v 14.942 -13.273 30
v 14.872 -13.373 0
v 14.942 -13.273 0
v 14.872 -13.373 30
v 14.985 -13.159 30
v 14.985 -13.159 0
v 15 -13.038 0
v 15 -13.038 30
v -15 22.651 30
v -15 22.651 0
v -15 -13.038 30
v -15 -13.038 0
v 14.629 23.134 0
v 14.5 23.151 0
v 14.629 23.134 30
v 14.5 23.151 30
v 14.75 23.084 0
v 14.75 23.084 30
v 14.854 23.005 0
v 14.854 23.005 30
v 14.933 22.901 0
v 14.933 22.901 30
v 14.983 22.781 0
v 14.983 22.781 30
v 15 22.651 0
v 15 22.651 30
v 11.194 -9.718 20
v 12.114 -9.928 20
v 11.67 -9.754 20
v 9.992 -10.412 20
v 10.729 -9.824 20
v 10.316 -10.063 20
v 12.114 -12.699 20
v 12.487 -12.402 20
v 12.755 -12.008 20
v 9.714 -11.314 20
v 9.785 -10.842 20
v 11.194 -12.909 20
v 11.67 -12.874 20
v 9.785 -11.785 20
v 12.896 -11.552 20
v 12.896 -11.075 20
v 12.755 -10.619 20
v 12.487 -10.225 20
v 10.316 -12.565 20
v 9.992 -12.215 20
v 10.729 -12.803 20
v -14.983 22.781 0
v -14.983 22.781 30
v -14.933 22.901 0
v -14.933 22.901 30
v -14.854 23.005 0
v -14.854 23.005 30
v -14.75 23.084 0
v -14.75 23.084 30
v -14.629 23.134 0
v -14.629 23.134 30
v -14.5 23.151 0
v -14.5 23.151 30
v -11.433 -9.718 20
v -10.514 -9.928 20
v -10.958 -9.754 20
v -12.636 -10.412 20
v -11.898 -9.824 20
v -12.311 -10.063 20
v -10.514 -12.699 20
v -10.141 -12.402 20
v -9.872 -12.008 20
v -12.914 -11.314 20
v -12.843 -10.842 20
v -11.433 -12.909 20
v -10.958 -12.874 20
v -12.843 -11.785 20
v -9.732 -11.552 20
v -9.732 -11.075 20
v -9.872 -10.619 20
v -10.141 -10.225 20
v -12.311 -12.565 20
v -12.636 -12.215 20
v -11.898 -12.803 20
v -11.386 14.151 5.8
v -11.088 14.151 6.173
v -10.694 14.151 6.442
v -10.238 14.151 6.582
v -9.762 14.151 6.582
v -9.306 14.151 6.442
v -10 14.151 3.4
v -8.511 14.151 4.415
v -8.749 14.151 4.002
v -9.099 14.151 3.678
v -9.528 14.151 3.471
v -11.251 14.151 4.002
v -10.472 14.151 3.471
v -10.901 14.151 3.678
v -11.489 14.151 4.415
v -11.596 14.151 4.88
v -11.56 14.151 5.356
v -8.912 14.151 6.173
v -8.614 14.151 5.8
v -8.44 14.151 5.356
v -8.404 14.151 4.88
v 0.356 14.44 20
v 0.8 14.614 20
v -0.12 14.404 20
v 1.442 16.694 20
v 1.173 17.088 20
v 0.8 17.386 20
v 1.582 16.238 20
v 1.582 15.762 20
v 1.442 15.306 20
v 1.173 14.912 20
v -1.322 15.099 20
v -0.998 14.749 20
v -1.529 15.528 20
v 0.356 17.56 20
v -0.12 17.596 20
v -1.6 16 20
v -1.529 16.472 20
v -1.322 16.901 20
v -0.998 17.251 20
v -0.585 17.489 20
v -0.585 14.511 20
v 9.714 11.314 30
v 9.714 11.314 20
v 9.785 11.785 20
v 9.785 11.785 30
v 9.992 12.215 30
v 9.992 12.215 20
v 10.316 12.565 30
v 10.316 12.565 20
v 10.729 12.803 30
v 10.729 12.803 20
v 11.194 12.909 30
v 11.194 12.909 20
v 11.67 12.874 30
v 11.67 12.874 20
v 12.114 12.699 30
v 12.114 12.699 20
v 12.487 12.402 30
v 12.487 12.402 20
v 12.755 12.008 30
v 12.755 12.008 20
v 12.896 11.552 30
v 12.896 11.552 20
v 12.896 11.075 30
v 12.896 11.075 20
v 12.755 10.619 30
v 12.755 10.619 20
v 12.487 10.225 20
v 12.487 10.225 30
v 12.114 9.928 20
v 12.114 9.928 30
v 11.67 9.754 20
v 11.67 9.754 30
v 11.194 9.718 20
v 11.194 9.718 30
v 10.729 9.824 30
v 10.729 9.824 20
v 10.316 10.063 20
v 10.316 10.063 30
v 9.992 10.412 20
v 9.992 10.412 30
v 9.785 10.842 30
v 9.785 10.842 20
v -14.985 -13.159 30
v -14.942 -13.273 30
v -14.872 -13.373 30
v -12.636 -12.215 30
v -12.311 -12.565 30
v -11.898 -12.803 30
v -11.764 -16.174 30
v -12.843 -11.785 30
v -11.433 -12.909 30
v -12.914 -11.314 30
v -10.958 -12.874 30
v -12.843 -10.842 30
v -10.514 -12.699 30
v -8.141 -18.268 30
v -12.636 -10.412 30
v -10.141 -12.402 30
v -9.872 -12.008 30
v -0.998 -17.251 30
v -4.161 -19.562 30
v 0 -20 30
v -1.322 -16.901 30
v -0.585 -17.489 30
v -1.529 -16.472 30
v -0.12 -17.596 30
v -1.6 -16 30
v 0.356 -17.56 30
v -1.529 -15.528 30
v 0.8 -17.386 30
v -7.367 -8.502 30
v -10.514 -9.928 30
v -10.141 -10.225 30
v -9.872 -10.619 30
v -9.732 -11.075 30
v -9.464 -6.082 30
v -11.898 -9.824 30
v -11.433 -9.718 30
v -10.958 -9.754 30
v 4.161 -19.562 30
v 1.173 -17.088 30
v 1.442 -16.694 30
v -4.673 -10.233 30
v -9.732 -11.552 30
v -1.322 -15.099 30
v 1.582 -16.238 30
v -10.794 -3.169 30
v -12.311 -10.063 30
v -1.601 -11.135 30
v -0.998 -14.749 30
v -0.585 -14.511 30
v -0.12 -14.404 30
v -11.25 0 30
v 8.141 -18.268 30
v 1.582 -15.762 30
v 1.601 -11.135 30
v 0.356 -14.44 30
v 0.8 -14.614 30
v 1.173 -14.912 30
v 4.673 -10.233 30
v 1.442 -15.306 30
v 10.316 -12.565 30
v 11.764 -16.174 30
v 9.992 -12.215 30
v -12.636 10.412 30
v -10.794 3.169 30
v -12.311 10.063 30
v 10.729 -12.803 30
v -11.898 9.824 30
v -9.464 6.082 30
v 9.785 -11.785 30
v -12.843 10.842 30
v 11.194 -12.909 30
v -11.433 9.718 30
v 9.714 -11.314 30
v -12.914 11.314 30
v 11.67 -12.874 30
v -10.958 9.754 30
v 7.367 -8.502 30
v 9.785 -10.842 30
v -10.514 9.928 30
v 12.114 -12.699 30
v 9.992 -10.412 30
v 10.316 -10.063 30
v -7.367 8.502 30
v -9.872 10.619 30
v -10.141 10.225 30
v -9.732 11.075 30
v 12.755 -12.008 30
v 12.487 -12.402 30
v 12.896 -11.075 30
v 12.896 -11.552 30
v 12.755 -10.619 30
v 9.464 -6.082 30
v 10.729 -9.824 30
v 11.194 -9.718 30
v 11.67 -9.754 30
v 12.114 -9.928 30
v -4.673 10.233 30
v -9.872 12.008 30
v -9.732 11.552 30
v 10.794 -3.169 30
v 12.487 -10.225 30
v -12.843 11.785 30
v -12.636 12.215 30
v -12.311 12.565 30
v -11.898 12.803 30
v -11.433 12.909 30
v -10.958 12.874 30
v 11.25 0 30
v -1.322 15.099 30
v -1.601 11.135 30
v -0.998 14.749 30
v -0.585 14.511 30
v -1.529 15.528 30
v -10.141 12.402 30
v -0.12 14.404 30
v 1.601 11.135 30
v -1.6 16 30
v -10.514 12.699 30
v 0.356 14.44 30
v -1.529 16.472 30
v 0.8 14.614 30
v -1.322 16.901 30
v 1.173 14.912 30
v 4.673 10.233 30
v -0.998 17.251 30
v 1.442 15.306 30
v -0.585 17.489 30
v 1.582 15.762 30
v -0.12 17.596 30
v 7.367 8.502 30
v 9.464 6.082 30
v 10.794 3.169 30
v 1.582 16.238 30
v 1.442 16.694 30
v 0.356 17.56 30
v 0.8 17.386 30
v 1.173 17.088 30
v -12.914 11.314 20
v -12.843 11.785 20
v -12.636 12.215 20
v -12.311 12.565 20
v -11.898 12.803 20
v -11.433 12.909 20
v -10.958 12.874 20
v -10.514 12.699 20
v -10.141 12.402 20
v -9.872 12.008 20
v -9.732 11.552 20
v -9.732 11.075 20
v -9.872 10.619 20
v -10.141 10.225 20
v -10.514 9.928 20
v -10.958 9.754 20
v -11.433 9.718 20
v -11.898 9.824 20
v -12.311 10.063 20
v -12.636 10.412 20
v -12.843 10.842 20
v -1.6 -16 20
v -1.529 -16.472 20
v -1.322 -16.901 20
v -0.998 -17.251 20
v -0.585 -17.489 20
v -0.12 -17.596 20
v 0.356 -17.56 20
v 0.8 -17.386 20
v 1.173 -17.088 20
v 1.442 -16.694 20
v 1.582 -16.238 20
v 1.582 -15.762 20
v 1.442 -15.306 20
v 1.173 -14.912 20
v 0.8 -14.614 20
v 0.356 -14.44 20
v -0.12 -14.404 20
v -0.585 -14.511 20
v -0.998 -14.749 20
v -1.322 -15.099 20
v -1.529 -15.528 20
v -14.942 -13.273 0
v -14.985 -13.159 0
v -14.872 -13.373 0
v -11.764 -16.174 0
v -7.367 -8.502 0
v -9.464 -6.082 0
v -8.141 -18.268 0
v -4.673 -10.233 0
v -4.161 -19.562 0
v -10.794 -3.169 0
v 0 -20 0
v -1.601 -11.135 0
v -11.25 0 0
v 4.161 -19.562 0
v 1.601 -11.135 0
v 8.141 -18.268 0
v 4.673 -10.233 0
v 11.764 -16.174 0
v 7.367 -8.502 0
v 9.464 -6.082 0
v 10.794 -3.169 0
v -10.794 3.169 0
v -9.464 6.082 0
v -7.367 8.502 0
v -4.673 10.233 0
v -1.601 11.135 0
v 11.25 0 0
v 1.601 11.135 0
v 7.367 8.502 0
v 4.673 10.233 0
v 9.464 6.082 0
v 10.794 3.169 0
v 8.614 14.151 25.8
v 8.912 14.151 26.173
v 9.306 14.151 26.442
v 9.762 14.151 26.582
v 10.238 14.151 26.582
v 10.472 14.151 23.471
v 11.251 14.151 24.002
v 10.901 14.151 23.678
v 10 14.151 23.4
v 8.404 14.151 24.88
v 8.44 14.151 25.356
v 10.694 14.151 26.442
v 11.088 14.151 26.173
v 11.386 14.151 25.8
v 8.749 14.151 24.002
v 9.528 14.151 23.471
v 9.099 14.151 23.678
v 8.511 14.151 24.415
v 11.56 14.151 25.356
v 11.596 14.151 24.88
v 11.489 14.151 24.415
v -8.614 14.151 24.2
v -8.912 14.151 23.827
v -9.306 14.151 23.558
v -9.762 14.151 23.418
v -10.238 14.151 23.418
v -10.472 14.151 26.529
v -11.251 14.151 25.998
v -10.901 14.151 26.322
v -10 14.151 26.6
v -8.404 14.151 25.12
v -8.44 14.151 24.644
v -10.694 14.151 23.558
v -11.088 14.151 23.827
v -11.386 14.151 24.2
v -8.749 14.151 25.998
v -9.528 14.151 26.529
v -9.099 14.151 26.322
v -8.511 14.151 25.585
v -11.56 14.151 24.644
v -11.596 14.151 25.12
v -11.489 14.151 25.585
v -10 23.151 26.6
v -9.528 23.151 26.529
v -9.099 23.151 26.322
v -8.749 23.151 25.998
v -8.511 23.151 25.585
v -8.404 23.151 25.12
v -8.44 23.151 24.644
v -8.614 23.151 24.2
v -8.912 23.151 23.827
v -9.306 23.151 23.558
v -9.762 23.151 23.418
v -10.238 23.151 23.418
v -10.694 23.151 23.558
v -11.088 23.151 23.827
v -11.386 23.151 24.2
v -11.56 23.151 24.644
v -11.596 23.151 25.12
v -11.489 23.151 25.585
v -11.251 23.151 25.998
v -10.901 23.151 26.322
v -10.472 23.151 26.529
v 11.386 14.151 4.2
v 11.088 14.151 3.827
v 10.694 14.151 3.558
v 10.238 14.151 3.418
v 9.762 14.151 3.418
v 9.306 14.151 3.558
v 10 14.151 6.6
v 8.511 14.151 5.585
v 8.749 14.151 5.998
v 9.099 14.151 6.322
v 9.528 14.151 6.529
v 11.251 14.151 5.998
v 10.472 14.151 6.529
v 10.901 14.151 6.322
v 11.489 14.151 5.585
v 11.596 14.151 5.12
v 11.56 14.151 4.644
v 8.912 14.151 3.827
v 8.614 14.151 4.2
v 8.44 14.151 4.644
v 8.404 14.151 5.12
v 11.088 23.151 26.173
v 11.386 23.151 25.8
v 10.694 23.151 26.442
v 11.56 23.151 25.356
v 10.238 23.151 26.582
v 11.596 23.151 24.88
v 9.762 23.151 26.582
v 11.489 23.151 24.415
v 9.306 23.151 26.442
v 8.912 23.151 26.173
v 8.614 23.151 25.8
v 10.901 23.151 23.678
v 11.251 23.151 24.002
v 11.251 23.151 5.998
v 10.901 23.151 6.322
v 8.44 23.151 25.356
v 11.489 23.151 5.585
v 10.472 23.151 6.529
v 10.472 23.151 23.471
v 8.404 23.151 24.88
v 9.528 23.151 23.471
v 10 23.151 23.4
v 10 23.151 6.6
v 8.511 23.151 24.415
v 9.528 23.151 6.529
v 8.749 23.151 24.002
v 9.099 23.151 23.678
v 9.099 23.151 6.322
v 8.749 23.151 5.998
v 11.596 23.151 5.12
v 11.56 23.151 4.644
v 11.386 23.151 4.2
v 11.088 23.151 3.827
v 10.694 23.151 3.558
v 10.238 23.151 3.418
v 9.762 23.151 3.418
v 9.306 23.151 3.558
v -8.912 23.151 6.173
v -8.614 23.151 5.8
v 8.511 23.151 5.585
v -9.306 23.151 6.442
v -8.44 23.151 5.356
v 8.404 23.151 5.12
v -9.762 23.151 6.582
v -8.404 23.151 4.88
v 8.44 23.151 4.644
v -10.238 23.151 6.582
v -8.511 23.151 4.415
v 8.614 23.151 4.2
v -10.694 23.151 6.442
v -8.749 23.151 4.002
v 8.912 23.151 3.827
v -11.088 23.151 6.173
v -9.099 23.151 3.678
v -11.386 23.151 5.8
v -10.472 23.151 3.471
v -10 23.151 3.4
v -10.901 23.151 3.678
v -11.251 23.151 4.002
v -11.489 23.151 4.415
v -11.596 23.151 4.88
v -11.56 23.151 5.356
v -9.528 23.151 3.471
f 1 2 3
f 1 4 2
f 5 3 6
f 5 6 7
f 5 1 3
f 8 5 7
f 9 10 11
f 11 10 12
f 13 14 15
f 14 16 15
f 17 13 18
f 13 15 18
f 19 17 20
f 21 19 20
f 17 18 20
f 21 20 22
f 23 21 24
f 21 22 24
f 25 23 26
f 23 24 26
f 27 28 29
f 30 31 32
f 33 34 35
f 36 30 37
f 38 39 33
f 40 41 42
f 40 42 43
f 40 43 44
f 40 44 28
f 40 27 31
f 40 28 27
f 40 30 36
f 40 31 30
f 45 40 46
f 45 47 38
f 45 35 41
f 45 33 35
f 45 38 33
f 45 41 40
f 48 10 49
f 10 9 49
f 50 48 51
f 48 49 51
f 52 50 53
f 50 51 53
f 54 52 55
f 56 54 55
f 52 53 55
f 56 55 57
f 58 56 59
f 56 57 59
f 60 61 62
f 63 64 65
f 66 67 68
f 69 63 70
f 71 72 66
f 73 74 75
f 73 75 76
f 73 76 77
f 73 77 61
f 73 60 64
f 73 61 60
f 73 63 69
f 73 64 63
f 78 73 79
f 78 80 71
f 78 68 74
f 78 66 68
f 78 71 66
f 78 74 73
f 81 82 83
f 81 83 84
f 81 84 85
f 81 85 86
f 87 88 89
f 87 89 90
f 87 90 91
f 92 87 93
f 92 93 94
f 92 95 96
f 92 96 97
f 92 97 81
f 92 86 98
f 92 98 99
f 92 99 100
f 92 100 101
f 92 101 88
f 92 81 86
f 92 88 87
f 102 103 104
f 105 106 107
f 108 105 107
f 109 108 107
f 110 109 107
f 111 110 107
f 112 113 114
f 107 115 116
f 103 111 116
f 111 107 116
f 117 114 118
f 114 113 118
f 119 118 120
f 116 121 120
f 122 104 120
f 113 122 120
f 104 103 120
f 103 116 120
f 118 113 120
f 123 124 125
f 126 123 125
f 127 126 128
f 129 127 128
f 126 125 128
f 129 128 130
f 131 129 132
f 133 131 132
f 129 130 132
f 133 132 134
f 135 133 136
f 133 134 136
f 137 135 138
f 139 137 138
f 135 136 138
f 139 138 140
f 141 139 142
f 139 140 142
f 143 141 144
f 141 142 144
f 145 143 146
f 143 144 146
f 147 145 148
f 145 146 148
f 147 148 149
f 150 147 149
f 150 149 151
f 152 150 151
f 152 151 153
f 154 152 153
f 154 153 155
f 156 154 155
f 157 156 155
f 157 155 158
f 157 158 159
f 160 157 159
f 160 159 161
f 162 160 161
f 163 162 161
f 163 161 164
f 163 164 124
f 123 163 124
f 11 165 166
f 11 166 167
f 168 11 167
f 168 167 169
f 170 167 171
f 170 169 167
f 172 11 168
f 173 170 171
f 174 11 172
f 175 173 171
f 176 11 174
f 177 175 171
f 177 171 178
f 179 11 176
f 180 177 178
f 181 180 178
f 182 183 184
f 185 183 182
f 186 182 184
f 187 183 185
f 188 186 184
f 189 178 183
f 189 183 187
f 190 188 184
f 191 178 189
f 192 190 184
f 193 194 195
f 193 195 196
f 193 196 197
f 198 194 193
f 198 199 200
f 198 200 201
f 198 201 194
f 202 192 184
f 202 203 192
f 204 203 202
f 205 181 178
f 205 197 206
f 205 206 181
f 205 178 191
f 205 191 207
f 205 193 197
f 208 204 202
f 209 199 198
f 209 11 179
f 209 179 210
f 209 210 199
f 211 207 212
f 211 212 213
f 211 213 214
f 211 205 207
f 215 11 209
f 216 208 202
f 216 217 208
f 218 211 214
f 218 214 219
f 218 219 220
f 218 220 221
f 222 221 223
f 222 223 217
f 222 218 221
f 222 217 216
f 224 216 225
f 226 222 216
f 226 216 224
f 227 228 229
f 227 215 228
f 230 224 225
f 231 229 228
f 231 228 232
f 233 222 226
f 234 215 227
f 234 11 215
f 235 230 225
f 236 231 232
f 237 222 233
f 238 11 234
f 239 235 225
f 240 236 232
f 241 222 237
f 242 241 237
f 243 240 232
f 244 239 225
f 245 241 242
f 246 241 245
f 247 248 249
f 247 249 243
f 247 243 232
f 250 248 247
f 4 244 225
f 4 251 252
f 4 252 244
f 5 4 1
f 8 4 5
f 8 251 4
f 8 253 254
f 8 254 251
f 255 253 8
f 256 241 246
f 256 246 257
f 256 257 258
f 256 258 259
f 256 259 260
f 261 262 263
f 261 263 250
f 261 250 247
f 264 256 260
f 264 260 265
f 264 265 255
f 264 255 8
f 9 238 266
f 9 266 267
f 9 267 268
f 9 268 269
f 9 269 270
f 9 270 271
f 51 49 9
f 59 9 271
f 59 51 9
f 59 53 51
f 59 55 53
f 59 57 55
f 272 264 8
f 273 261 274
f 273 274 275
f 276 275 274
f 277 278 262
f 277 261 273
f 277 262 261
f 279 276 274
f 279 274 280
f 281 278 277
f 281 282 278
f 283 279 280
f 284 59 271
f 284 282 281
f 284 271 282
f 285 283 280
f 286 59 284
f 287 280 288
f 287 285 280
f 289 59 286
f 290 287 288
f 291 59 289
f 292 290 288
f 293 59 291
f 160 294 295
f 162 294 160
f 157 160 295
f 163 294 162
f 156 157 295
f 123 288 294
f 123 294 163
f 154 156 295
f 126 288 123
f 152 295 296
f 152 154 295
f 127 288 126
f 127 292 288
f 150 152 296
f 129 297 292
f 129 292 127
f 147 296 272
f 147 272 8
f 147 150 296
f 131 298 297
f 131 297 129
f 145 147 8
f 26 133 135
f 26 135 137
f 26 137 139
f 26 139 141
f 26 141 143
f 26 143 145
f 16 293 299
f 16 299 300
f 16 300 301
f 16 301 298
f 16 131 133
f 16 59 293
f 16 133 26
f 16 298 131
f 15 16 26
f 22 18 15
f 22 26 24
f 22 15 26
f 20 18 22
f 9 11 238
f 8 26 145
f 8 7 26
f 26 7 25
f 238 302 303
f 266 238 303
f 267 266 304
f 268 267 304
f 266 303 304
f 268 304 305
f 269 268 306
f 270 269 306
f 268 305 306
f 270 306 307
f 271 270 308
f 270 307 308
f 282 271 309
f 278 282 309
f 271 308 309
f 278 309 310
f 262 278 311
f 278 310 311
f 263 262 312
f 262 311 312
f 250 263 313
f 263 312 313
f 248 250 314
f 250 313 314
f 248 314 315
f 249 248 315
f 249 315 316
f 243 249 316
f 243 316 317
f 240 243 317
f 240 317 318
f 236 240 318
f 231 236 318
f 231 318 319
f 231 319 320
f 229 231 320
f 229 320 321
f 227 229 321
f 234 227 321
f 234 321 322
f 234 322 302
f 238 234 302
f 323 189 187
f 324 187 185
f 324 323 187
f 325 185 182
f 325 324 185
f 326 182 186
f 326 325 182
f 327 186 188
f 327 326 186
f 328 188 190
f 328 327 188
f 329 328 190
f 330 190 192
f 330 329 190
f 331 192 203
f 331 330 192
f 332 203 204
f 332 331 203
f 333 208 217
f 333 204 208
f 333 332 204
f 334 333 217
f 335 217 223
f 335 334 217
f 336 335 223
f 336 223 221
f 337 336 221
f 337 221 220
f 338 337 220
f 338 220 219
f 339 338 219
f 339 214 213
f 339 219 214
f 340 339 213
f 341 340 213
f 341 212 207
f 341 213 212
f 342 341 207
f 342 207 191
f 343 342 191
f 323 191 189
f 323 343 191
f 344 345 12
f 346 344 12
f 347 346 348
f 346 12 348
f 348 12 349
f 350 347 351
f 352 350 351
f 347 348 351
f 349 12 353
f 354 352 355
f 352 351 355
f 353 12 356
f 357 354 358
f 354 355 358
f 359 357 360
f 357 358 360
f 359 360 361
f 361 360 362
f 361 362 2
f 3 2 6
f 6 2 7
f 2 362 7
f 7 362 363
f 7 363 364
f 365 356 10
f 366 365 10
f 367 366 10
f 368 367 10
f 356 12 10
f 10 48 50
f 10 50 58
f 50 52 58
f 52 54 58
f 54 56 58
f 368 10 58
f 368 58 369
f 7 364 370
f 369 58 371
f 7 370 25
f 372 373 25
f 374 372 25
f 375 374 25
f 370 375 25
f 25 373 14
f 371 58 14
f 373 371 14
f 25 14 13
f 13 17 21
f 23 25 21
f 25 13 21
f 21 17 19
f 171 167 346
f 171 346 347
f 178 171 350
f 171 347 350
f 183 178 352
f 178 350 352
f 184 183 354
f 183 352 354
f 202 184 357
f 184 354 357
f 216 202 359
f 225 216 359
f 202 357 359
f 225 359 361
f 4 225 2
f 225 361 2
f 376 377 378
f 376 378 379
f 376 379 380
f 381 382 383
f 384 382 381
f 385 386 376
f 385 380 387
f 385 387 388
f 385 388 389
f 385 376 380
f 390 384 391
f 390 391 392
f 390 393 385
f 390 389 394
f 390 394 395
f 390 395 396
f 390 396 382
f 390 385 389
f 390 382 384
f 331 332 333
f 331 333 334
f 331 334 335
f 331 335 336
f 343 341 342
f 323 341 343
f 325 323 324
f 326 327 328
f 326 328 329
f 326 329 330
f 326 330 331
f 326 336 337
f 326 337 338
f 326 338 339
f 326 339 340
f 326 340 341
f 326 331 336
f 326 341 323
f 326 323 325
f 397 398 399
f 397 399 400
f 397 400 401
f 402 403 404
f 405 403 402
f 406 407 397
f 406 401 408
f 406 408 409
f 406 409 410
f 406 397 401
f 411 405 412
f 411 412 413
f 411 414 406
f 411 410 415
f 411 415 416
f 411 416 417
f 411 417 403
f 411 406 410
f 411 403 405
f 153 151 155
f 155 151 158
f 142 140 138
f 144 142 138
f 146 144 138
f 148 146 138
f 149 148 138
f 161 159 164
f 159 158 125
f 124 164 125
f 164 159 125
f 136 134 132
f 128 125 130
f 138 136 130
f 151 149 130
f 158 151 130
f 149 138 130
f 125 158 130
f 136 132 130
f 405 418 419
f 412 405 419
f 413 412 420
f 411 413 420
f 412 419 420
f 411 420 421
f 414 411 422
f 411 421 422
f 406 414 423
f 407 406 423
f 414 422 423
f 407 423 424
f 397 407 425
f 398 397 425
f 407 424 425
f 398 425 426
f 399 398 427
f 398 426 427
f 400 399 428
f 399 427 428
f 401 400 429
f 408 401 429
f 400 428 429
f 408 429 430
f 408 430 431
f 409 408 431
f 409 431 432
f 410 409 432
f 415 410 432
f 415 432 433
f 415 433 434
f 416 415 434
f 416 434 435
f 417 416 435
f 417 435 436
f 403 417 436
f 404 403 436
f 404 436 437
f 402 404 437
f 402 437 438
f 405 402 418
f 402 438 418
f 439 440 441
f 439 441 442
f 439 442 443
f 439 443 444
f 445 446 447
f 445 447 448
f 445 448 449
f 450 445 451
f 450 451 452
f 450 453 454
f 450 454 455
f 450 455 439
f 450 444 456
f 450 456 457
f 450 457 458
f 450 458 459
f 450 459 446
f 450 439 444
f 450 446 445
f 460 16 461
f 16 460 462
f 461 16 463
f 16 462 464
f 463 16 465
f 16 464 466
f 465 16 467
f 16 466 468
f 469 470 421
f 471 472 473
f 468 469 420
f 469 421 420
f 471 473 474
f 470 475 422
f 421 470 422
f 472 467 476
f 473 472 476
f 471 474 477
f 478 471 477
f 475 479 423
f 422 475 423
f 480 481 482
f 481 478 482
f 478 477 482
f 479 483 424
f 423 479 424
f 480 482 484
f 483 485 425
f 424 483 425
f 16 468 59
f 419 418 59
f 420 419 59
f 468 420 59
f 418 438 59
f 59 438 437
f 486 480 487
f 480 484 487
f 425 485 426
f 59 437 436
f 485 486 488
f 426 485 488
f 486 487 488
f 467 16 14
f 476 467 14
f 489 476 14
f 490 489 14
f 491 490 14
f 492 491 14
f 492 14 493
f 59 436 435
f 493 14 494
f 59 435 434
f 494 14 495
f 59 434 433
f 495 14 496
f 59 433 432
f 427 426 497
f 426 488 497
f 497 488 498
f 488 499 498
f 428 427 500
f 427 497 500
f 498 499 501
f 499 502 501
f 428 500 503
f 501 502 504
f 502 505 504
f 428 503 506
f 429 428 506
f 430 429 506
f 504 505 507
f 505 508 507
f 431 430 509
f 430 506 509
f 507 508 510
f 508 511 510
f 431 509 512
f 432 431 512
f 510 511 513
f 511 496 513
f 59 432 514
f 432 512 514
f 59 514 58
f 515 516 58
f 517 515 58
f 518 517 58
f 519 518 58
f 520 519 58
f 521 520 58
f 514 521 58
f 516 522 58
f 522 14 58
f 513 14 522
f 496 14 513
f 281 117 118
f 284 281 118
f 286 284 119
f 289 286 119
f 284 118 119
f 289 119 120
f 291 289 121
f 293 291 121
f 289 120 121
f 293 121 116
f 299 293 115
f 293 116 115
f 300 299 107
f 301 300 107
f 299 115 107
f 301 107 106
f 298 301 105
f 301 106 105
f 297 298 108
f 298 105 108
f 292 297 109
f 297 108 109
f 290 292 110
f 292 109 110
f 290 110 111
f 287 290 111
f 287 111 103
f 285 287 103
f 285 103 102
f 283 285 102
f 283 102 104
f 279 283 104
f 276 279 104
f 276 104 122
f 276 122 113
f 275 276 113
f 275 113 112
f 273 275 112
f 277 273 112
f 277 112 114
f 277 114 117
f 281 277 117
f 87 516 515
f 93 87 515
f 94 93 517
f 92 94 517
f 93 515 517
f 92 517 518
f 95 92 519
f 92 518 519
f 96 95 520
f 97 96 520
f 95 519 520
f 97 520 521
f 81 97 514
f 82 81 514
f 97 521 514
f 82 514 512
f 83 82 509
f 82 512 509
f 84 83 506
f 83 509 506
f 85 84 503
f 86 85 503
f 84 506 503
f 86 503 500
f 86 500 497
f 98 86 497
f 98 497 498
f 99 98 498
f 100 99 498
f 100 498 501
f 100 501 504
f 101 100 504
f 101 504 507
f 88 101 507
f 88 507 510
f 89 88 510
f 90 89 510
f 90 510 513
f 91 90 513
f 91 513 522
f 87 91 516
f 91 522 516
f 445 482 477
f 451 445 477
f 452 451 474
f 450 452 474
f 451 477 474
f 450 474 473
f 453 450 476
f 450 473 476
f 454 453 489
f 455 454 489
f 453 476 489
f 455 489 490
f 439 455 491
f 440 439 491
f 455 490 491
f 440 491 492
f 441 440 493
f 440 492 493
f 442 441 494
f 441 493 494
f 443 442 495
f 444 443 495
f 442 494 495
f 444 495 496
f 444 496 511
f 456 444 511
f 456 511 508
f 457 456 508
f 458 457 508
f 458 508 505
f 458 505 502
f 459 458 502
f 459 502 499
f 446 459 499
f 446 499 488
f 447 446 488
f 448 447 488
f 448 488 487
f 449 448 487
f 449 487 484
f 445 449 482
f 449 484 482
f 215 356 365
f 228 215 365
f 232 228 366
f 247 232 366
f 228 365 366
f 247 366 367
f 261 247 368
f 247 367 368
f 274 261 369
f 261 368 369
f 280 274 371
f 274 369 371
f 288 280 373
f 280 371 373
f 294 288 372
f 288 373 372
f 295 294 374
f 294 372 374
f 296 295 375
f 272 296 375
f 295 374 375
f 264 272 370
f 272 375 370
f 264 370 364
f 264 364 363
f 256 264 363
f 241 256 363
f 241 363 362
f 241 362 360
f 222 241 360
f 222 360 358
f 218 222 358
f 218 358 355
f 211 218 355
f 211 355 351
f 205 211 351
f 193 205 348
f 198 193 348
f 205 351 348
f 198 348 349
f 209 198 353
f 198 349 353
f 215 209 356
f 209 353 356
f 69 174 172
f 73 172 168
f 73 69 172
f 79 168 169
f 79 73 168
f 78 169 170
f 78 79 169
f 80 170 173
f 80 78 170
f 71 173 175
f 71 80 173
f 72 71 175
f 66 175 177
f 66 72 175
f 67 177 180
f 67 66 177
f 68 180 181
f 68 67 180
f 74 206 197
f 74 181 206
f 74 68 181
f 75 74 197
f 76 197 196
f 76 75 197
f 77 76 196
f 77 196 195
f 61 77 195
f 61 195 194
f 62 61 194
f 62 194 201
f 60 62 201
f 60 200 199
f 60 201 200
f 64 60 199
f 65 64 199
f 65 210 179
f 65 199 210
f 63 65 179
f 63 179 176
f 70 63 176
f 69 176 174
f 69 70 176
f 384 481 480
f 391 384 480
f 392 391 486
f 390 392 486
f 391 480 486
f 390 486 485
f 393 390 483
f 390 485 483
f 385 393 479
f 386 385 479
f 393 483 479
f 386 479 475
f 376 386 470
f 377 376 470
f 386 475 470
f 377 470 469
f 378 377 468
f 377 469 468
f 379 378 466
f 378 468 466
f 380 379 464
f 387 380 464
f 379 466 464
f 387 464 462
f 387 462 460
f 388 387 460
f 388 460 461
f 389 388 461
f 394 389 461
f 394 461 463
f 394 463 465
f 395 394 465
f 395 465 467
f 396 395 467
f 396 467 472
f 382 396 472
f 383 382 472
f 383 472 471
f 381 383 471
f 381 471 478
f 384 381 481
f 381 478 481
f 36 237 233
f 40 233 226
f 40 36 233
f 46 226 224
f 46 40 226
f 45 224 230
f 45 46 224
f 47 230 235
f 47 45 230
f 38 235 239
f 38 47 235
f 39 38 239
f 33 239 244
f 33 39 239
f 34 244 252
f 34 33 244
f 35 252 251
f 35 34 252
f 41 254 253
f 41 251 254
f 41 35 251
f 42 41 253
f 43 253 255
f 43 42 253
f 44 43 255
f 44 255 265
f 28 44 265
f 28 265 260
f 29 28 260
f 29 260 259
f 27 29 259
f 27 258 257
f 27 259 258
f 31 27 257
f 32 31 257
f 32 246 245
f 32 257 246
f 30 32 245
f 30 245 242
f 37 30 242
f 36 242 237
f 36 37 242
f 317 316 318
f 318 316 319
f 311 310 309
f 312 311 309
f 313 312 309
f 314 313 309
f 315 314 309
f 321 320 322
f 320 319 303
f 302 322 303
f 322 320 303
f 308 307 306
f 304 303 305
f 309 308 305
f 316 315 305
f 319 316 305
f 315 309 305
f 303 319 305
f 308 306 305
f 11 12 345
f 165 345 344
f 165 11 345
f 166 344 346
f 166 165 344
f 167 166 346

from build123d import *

# Parameters (mm, degrees)
BOSS_EXTRUDE1_DEPTH = 30
CUT_EXTRUDE2_START  = -20
SKETCH4_R           = 1.6
CUT_EXTRUDE2_DEPTH  = 20
SKETCH2_R           = 11.25
CUT_EXTRUDE3_DEPTH  = 30
SKETCH5_R           = 1.6
CUT_EXTRUDE4_DEPTH  = 9
FILLET1_R           = 0.5


with BuildPart() as part:
    # Sketch1 → Boss-Extrude1 (new body)
    with BuildSketch(Plane.XY):
        with BuildLine():
            Line((-15, 23.151243445), (-15, -13.228756555))
            ThreePointArc((-15, -13.228756555), (0, -20), (15, -13.228756555))
            Line((15, -13.228756555), (15, 23.151243445))
            Line((15, 23.151243445), (-15, 23.151243445))
        make_face()
    extrude(amount=BOSS_EXTRUDE1_DEPTH)

    # Sketch4 → Cut-Extrude2 (cut)
    with BuildSketch(Plane(origin=(0, 0, 0), x_dir=(-1, 0, 0), z_dir=(0, 0, -1)).offset(CUT_EXTRUDE2_START)):
        with Locations((-11.313708499, 11.313708499)):
            Circle(SKETCH4_R)
        with Locations((0, 16)):
            Circle(SKETCH4_R)
        with Locations((11.313708499, 11.313708499)):
            Circle(SKETCH4_R)
    cut_extrude2 = extrude(amount=-CUT_EXTRUDE2_DEPTH, mode=Mode.SUBTRACT)

    # Mirror1: Cut-Extrude2 across plane
    add(cut_extrude2.mirror(Plane.ZX), mode=Mode.SUBTRACT)

    # Sketch2 → Cut-Extrude3 (cut)
    with BuildSketch(Plane(origin=(0, 0, 0), x_dir=(-1, 0, 0), z_dir=(0, 0, -1))):
        Circle(SKETCH2_R)
    extrude(amount=-CUT_EXTRUDE3_DEPTH, mode=Mode.SUBTRACT)

    # Sketch5 → Cut-Extrude4 (cut)
    with BuildSketch(Plane(origin=(0, 23.151243445, 0), x_dir=(1, 0, 0), z_dir=(0, 1, 0))):
        with Locations(Location((10, -25, 0), (0, 0, 90))):
            Circle(SKETCH5_R)
        with Locations(Location((-10, -25, 0), (0, 0, 270))):
            Circle(SKETCH5_R)
        with Locations(Location((10, -5, 0), (0, 0, 270))):
            Circle(SKETCH5_R)
        with Locations(Location((-10, -5, 0), (0, 0, 90))):
            Circle(SKETCH5_R)
    extrude(amount=-CUT_EXTRUDE4_DEPTH, mode=Mode.SUBTRACT)

    # Fillet1
    fillet1_edges = [part.edges().sort_by_distance(p)[0] for p in [
        (15, 23.151243445, 15),
        (15, -13.228756555, 15),
        (-15, -13.228756555, 15),
        (-15, 23.151243445, 15),
    ]]
    fillet(fillet1_edges, radius=FILLET1_R)


solid = part.part
